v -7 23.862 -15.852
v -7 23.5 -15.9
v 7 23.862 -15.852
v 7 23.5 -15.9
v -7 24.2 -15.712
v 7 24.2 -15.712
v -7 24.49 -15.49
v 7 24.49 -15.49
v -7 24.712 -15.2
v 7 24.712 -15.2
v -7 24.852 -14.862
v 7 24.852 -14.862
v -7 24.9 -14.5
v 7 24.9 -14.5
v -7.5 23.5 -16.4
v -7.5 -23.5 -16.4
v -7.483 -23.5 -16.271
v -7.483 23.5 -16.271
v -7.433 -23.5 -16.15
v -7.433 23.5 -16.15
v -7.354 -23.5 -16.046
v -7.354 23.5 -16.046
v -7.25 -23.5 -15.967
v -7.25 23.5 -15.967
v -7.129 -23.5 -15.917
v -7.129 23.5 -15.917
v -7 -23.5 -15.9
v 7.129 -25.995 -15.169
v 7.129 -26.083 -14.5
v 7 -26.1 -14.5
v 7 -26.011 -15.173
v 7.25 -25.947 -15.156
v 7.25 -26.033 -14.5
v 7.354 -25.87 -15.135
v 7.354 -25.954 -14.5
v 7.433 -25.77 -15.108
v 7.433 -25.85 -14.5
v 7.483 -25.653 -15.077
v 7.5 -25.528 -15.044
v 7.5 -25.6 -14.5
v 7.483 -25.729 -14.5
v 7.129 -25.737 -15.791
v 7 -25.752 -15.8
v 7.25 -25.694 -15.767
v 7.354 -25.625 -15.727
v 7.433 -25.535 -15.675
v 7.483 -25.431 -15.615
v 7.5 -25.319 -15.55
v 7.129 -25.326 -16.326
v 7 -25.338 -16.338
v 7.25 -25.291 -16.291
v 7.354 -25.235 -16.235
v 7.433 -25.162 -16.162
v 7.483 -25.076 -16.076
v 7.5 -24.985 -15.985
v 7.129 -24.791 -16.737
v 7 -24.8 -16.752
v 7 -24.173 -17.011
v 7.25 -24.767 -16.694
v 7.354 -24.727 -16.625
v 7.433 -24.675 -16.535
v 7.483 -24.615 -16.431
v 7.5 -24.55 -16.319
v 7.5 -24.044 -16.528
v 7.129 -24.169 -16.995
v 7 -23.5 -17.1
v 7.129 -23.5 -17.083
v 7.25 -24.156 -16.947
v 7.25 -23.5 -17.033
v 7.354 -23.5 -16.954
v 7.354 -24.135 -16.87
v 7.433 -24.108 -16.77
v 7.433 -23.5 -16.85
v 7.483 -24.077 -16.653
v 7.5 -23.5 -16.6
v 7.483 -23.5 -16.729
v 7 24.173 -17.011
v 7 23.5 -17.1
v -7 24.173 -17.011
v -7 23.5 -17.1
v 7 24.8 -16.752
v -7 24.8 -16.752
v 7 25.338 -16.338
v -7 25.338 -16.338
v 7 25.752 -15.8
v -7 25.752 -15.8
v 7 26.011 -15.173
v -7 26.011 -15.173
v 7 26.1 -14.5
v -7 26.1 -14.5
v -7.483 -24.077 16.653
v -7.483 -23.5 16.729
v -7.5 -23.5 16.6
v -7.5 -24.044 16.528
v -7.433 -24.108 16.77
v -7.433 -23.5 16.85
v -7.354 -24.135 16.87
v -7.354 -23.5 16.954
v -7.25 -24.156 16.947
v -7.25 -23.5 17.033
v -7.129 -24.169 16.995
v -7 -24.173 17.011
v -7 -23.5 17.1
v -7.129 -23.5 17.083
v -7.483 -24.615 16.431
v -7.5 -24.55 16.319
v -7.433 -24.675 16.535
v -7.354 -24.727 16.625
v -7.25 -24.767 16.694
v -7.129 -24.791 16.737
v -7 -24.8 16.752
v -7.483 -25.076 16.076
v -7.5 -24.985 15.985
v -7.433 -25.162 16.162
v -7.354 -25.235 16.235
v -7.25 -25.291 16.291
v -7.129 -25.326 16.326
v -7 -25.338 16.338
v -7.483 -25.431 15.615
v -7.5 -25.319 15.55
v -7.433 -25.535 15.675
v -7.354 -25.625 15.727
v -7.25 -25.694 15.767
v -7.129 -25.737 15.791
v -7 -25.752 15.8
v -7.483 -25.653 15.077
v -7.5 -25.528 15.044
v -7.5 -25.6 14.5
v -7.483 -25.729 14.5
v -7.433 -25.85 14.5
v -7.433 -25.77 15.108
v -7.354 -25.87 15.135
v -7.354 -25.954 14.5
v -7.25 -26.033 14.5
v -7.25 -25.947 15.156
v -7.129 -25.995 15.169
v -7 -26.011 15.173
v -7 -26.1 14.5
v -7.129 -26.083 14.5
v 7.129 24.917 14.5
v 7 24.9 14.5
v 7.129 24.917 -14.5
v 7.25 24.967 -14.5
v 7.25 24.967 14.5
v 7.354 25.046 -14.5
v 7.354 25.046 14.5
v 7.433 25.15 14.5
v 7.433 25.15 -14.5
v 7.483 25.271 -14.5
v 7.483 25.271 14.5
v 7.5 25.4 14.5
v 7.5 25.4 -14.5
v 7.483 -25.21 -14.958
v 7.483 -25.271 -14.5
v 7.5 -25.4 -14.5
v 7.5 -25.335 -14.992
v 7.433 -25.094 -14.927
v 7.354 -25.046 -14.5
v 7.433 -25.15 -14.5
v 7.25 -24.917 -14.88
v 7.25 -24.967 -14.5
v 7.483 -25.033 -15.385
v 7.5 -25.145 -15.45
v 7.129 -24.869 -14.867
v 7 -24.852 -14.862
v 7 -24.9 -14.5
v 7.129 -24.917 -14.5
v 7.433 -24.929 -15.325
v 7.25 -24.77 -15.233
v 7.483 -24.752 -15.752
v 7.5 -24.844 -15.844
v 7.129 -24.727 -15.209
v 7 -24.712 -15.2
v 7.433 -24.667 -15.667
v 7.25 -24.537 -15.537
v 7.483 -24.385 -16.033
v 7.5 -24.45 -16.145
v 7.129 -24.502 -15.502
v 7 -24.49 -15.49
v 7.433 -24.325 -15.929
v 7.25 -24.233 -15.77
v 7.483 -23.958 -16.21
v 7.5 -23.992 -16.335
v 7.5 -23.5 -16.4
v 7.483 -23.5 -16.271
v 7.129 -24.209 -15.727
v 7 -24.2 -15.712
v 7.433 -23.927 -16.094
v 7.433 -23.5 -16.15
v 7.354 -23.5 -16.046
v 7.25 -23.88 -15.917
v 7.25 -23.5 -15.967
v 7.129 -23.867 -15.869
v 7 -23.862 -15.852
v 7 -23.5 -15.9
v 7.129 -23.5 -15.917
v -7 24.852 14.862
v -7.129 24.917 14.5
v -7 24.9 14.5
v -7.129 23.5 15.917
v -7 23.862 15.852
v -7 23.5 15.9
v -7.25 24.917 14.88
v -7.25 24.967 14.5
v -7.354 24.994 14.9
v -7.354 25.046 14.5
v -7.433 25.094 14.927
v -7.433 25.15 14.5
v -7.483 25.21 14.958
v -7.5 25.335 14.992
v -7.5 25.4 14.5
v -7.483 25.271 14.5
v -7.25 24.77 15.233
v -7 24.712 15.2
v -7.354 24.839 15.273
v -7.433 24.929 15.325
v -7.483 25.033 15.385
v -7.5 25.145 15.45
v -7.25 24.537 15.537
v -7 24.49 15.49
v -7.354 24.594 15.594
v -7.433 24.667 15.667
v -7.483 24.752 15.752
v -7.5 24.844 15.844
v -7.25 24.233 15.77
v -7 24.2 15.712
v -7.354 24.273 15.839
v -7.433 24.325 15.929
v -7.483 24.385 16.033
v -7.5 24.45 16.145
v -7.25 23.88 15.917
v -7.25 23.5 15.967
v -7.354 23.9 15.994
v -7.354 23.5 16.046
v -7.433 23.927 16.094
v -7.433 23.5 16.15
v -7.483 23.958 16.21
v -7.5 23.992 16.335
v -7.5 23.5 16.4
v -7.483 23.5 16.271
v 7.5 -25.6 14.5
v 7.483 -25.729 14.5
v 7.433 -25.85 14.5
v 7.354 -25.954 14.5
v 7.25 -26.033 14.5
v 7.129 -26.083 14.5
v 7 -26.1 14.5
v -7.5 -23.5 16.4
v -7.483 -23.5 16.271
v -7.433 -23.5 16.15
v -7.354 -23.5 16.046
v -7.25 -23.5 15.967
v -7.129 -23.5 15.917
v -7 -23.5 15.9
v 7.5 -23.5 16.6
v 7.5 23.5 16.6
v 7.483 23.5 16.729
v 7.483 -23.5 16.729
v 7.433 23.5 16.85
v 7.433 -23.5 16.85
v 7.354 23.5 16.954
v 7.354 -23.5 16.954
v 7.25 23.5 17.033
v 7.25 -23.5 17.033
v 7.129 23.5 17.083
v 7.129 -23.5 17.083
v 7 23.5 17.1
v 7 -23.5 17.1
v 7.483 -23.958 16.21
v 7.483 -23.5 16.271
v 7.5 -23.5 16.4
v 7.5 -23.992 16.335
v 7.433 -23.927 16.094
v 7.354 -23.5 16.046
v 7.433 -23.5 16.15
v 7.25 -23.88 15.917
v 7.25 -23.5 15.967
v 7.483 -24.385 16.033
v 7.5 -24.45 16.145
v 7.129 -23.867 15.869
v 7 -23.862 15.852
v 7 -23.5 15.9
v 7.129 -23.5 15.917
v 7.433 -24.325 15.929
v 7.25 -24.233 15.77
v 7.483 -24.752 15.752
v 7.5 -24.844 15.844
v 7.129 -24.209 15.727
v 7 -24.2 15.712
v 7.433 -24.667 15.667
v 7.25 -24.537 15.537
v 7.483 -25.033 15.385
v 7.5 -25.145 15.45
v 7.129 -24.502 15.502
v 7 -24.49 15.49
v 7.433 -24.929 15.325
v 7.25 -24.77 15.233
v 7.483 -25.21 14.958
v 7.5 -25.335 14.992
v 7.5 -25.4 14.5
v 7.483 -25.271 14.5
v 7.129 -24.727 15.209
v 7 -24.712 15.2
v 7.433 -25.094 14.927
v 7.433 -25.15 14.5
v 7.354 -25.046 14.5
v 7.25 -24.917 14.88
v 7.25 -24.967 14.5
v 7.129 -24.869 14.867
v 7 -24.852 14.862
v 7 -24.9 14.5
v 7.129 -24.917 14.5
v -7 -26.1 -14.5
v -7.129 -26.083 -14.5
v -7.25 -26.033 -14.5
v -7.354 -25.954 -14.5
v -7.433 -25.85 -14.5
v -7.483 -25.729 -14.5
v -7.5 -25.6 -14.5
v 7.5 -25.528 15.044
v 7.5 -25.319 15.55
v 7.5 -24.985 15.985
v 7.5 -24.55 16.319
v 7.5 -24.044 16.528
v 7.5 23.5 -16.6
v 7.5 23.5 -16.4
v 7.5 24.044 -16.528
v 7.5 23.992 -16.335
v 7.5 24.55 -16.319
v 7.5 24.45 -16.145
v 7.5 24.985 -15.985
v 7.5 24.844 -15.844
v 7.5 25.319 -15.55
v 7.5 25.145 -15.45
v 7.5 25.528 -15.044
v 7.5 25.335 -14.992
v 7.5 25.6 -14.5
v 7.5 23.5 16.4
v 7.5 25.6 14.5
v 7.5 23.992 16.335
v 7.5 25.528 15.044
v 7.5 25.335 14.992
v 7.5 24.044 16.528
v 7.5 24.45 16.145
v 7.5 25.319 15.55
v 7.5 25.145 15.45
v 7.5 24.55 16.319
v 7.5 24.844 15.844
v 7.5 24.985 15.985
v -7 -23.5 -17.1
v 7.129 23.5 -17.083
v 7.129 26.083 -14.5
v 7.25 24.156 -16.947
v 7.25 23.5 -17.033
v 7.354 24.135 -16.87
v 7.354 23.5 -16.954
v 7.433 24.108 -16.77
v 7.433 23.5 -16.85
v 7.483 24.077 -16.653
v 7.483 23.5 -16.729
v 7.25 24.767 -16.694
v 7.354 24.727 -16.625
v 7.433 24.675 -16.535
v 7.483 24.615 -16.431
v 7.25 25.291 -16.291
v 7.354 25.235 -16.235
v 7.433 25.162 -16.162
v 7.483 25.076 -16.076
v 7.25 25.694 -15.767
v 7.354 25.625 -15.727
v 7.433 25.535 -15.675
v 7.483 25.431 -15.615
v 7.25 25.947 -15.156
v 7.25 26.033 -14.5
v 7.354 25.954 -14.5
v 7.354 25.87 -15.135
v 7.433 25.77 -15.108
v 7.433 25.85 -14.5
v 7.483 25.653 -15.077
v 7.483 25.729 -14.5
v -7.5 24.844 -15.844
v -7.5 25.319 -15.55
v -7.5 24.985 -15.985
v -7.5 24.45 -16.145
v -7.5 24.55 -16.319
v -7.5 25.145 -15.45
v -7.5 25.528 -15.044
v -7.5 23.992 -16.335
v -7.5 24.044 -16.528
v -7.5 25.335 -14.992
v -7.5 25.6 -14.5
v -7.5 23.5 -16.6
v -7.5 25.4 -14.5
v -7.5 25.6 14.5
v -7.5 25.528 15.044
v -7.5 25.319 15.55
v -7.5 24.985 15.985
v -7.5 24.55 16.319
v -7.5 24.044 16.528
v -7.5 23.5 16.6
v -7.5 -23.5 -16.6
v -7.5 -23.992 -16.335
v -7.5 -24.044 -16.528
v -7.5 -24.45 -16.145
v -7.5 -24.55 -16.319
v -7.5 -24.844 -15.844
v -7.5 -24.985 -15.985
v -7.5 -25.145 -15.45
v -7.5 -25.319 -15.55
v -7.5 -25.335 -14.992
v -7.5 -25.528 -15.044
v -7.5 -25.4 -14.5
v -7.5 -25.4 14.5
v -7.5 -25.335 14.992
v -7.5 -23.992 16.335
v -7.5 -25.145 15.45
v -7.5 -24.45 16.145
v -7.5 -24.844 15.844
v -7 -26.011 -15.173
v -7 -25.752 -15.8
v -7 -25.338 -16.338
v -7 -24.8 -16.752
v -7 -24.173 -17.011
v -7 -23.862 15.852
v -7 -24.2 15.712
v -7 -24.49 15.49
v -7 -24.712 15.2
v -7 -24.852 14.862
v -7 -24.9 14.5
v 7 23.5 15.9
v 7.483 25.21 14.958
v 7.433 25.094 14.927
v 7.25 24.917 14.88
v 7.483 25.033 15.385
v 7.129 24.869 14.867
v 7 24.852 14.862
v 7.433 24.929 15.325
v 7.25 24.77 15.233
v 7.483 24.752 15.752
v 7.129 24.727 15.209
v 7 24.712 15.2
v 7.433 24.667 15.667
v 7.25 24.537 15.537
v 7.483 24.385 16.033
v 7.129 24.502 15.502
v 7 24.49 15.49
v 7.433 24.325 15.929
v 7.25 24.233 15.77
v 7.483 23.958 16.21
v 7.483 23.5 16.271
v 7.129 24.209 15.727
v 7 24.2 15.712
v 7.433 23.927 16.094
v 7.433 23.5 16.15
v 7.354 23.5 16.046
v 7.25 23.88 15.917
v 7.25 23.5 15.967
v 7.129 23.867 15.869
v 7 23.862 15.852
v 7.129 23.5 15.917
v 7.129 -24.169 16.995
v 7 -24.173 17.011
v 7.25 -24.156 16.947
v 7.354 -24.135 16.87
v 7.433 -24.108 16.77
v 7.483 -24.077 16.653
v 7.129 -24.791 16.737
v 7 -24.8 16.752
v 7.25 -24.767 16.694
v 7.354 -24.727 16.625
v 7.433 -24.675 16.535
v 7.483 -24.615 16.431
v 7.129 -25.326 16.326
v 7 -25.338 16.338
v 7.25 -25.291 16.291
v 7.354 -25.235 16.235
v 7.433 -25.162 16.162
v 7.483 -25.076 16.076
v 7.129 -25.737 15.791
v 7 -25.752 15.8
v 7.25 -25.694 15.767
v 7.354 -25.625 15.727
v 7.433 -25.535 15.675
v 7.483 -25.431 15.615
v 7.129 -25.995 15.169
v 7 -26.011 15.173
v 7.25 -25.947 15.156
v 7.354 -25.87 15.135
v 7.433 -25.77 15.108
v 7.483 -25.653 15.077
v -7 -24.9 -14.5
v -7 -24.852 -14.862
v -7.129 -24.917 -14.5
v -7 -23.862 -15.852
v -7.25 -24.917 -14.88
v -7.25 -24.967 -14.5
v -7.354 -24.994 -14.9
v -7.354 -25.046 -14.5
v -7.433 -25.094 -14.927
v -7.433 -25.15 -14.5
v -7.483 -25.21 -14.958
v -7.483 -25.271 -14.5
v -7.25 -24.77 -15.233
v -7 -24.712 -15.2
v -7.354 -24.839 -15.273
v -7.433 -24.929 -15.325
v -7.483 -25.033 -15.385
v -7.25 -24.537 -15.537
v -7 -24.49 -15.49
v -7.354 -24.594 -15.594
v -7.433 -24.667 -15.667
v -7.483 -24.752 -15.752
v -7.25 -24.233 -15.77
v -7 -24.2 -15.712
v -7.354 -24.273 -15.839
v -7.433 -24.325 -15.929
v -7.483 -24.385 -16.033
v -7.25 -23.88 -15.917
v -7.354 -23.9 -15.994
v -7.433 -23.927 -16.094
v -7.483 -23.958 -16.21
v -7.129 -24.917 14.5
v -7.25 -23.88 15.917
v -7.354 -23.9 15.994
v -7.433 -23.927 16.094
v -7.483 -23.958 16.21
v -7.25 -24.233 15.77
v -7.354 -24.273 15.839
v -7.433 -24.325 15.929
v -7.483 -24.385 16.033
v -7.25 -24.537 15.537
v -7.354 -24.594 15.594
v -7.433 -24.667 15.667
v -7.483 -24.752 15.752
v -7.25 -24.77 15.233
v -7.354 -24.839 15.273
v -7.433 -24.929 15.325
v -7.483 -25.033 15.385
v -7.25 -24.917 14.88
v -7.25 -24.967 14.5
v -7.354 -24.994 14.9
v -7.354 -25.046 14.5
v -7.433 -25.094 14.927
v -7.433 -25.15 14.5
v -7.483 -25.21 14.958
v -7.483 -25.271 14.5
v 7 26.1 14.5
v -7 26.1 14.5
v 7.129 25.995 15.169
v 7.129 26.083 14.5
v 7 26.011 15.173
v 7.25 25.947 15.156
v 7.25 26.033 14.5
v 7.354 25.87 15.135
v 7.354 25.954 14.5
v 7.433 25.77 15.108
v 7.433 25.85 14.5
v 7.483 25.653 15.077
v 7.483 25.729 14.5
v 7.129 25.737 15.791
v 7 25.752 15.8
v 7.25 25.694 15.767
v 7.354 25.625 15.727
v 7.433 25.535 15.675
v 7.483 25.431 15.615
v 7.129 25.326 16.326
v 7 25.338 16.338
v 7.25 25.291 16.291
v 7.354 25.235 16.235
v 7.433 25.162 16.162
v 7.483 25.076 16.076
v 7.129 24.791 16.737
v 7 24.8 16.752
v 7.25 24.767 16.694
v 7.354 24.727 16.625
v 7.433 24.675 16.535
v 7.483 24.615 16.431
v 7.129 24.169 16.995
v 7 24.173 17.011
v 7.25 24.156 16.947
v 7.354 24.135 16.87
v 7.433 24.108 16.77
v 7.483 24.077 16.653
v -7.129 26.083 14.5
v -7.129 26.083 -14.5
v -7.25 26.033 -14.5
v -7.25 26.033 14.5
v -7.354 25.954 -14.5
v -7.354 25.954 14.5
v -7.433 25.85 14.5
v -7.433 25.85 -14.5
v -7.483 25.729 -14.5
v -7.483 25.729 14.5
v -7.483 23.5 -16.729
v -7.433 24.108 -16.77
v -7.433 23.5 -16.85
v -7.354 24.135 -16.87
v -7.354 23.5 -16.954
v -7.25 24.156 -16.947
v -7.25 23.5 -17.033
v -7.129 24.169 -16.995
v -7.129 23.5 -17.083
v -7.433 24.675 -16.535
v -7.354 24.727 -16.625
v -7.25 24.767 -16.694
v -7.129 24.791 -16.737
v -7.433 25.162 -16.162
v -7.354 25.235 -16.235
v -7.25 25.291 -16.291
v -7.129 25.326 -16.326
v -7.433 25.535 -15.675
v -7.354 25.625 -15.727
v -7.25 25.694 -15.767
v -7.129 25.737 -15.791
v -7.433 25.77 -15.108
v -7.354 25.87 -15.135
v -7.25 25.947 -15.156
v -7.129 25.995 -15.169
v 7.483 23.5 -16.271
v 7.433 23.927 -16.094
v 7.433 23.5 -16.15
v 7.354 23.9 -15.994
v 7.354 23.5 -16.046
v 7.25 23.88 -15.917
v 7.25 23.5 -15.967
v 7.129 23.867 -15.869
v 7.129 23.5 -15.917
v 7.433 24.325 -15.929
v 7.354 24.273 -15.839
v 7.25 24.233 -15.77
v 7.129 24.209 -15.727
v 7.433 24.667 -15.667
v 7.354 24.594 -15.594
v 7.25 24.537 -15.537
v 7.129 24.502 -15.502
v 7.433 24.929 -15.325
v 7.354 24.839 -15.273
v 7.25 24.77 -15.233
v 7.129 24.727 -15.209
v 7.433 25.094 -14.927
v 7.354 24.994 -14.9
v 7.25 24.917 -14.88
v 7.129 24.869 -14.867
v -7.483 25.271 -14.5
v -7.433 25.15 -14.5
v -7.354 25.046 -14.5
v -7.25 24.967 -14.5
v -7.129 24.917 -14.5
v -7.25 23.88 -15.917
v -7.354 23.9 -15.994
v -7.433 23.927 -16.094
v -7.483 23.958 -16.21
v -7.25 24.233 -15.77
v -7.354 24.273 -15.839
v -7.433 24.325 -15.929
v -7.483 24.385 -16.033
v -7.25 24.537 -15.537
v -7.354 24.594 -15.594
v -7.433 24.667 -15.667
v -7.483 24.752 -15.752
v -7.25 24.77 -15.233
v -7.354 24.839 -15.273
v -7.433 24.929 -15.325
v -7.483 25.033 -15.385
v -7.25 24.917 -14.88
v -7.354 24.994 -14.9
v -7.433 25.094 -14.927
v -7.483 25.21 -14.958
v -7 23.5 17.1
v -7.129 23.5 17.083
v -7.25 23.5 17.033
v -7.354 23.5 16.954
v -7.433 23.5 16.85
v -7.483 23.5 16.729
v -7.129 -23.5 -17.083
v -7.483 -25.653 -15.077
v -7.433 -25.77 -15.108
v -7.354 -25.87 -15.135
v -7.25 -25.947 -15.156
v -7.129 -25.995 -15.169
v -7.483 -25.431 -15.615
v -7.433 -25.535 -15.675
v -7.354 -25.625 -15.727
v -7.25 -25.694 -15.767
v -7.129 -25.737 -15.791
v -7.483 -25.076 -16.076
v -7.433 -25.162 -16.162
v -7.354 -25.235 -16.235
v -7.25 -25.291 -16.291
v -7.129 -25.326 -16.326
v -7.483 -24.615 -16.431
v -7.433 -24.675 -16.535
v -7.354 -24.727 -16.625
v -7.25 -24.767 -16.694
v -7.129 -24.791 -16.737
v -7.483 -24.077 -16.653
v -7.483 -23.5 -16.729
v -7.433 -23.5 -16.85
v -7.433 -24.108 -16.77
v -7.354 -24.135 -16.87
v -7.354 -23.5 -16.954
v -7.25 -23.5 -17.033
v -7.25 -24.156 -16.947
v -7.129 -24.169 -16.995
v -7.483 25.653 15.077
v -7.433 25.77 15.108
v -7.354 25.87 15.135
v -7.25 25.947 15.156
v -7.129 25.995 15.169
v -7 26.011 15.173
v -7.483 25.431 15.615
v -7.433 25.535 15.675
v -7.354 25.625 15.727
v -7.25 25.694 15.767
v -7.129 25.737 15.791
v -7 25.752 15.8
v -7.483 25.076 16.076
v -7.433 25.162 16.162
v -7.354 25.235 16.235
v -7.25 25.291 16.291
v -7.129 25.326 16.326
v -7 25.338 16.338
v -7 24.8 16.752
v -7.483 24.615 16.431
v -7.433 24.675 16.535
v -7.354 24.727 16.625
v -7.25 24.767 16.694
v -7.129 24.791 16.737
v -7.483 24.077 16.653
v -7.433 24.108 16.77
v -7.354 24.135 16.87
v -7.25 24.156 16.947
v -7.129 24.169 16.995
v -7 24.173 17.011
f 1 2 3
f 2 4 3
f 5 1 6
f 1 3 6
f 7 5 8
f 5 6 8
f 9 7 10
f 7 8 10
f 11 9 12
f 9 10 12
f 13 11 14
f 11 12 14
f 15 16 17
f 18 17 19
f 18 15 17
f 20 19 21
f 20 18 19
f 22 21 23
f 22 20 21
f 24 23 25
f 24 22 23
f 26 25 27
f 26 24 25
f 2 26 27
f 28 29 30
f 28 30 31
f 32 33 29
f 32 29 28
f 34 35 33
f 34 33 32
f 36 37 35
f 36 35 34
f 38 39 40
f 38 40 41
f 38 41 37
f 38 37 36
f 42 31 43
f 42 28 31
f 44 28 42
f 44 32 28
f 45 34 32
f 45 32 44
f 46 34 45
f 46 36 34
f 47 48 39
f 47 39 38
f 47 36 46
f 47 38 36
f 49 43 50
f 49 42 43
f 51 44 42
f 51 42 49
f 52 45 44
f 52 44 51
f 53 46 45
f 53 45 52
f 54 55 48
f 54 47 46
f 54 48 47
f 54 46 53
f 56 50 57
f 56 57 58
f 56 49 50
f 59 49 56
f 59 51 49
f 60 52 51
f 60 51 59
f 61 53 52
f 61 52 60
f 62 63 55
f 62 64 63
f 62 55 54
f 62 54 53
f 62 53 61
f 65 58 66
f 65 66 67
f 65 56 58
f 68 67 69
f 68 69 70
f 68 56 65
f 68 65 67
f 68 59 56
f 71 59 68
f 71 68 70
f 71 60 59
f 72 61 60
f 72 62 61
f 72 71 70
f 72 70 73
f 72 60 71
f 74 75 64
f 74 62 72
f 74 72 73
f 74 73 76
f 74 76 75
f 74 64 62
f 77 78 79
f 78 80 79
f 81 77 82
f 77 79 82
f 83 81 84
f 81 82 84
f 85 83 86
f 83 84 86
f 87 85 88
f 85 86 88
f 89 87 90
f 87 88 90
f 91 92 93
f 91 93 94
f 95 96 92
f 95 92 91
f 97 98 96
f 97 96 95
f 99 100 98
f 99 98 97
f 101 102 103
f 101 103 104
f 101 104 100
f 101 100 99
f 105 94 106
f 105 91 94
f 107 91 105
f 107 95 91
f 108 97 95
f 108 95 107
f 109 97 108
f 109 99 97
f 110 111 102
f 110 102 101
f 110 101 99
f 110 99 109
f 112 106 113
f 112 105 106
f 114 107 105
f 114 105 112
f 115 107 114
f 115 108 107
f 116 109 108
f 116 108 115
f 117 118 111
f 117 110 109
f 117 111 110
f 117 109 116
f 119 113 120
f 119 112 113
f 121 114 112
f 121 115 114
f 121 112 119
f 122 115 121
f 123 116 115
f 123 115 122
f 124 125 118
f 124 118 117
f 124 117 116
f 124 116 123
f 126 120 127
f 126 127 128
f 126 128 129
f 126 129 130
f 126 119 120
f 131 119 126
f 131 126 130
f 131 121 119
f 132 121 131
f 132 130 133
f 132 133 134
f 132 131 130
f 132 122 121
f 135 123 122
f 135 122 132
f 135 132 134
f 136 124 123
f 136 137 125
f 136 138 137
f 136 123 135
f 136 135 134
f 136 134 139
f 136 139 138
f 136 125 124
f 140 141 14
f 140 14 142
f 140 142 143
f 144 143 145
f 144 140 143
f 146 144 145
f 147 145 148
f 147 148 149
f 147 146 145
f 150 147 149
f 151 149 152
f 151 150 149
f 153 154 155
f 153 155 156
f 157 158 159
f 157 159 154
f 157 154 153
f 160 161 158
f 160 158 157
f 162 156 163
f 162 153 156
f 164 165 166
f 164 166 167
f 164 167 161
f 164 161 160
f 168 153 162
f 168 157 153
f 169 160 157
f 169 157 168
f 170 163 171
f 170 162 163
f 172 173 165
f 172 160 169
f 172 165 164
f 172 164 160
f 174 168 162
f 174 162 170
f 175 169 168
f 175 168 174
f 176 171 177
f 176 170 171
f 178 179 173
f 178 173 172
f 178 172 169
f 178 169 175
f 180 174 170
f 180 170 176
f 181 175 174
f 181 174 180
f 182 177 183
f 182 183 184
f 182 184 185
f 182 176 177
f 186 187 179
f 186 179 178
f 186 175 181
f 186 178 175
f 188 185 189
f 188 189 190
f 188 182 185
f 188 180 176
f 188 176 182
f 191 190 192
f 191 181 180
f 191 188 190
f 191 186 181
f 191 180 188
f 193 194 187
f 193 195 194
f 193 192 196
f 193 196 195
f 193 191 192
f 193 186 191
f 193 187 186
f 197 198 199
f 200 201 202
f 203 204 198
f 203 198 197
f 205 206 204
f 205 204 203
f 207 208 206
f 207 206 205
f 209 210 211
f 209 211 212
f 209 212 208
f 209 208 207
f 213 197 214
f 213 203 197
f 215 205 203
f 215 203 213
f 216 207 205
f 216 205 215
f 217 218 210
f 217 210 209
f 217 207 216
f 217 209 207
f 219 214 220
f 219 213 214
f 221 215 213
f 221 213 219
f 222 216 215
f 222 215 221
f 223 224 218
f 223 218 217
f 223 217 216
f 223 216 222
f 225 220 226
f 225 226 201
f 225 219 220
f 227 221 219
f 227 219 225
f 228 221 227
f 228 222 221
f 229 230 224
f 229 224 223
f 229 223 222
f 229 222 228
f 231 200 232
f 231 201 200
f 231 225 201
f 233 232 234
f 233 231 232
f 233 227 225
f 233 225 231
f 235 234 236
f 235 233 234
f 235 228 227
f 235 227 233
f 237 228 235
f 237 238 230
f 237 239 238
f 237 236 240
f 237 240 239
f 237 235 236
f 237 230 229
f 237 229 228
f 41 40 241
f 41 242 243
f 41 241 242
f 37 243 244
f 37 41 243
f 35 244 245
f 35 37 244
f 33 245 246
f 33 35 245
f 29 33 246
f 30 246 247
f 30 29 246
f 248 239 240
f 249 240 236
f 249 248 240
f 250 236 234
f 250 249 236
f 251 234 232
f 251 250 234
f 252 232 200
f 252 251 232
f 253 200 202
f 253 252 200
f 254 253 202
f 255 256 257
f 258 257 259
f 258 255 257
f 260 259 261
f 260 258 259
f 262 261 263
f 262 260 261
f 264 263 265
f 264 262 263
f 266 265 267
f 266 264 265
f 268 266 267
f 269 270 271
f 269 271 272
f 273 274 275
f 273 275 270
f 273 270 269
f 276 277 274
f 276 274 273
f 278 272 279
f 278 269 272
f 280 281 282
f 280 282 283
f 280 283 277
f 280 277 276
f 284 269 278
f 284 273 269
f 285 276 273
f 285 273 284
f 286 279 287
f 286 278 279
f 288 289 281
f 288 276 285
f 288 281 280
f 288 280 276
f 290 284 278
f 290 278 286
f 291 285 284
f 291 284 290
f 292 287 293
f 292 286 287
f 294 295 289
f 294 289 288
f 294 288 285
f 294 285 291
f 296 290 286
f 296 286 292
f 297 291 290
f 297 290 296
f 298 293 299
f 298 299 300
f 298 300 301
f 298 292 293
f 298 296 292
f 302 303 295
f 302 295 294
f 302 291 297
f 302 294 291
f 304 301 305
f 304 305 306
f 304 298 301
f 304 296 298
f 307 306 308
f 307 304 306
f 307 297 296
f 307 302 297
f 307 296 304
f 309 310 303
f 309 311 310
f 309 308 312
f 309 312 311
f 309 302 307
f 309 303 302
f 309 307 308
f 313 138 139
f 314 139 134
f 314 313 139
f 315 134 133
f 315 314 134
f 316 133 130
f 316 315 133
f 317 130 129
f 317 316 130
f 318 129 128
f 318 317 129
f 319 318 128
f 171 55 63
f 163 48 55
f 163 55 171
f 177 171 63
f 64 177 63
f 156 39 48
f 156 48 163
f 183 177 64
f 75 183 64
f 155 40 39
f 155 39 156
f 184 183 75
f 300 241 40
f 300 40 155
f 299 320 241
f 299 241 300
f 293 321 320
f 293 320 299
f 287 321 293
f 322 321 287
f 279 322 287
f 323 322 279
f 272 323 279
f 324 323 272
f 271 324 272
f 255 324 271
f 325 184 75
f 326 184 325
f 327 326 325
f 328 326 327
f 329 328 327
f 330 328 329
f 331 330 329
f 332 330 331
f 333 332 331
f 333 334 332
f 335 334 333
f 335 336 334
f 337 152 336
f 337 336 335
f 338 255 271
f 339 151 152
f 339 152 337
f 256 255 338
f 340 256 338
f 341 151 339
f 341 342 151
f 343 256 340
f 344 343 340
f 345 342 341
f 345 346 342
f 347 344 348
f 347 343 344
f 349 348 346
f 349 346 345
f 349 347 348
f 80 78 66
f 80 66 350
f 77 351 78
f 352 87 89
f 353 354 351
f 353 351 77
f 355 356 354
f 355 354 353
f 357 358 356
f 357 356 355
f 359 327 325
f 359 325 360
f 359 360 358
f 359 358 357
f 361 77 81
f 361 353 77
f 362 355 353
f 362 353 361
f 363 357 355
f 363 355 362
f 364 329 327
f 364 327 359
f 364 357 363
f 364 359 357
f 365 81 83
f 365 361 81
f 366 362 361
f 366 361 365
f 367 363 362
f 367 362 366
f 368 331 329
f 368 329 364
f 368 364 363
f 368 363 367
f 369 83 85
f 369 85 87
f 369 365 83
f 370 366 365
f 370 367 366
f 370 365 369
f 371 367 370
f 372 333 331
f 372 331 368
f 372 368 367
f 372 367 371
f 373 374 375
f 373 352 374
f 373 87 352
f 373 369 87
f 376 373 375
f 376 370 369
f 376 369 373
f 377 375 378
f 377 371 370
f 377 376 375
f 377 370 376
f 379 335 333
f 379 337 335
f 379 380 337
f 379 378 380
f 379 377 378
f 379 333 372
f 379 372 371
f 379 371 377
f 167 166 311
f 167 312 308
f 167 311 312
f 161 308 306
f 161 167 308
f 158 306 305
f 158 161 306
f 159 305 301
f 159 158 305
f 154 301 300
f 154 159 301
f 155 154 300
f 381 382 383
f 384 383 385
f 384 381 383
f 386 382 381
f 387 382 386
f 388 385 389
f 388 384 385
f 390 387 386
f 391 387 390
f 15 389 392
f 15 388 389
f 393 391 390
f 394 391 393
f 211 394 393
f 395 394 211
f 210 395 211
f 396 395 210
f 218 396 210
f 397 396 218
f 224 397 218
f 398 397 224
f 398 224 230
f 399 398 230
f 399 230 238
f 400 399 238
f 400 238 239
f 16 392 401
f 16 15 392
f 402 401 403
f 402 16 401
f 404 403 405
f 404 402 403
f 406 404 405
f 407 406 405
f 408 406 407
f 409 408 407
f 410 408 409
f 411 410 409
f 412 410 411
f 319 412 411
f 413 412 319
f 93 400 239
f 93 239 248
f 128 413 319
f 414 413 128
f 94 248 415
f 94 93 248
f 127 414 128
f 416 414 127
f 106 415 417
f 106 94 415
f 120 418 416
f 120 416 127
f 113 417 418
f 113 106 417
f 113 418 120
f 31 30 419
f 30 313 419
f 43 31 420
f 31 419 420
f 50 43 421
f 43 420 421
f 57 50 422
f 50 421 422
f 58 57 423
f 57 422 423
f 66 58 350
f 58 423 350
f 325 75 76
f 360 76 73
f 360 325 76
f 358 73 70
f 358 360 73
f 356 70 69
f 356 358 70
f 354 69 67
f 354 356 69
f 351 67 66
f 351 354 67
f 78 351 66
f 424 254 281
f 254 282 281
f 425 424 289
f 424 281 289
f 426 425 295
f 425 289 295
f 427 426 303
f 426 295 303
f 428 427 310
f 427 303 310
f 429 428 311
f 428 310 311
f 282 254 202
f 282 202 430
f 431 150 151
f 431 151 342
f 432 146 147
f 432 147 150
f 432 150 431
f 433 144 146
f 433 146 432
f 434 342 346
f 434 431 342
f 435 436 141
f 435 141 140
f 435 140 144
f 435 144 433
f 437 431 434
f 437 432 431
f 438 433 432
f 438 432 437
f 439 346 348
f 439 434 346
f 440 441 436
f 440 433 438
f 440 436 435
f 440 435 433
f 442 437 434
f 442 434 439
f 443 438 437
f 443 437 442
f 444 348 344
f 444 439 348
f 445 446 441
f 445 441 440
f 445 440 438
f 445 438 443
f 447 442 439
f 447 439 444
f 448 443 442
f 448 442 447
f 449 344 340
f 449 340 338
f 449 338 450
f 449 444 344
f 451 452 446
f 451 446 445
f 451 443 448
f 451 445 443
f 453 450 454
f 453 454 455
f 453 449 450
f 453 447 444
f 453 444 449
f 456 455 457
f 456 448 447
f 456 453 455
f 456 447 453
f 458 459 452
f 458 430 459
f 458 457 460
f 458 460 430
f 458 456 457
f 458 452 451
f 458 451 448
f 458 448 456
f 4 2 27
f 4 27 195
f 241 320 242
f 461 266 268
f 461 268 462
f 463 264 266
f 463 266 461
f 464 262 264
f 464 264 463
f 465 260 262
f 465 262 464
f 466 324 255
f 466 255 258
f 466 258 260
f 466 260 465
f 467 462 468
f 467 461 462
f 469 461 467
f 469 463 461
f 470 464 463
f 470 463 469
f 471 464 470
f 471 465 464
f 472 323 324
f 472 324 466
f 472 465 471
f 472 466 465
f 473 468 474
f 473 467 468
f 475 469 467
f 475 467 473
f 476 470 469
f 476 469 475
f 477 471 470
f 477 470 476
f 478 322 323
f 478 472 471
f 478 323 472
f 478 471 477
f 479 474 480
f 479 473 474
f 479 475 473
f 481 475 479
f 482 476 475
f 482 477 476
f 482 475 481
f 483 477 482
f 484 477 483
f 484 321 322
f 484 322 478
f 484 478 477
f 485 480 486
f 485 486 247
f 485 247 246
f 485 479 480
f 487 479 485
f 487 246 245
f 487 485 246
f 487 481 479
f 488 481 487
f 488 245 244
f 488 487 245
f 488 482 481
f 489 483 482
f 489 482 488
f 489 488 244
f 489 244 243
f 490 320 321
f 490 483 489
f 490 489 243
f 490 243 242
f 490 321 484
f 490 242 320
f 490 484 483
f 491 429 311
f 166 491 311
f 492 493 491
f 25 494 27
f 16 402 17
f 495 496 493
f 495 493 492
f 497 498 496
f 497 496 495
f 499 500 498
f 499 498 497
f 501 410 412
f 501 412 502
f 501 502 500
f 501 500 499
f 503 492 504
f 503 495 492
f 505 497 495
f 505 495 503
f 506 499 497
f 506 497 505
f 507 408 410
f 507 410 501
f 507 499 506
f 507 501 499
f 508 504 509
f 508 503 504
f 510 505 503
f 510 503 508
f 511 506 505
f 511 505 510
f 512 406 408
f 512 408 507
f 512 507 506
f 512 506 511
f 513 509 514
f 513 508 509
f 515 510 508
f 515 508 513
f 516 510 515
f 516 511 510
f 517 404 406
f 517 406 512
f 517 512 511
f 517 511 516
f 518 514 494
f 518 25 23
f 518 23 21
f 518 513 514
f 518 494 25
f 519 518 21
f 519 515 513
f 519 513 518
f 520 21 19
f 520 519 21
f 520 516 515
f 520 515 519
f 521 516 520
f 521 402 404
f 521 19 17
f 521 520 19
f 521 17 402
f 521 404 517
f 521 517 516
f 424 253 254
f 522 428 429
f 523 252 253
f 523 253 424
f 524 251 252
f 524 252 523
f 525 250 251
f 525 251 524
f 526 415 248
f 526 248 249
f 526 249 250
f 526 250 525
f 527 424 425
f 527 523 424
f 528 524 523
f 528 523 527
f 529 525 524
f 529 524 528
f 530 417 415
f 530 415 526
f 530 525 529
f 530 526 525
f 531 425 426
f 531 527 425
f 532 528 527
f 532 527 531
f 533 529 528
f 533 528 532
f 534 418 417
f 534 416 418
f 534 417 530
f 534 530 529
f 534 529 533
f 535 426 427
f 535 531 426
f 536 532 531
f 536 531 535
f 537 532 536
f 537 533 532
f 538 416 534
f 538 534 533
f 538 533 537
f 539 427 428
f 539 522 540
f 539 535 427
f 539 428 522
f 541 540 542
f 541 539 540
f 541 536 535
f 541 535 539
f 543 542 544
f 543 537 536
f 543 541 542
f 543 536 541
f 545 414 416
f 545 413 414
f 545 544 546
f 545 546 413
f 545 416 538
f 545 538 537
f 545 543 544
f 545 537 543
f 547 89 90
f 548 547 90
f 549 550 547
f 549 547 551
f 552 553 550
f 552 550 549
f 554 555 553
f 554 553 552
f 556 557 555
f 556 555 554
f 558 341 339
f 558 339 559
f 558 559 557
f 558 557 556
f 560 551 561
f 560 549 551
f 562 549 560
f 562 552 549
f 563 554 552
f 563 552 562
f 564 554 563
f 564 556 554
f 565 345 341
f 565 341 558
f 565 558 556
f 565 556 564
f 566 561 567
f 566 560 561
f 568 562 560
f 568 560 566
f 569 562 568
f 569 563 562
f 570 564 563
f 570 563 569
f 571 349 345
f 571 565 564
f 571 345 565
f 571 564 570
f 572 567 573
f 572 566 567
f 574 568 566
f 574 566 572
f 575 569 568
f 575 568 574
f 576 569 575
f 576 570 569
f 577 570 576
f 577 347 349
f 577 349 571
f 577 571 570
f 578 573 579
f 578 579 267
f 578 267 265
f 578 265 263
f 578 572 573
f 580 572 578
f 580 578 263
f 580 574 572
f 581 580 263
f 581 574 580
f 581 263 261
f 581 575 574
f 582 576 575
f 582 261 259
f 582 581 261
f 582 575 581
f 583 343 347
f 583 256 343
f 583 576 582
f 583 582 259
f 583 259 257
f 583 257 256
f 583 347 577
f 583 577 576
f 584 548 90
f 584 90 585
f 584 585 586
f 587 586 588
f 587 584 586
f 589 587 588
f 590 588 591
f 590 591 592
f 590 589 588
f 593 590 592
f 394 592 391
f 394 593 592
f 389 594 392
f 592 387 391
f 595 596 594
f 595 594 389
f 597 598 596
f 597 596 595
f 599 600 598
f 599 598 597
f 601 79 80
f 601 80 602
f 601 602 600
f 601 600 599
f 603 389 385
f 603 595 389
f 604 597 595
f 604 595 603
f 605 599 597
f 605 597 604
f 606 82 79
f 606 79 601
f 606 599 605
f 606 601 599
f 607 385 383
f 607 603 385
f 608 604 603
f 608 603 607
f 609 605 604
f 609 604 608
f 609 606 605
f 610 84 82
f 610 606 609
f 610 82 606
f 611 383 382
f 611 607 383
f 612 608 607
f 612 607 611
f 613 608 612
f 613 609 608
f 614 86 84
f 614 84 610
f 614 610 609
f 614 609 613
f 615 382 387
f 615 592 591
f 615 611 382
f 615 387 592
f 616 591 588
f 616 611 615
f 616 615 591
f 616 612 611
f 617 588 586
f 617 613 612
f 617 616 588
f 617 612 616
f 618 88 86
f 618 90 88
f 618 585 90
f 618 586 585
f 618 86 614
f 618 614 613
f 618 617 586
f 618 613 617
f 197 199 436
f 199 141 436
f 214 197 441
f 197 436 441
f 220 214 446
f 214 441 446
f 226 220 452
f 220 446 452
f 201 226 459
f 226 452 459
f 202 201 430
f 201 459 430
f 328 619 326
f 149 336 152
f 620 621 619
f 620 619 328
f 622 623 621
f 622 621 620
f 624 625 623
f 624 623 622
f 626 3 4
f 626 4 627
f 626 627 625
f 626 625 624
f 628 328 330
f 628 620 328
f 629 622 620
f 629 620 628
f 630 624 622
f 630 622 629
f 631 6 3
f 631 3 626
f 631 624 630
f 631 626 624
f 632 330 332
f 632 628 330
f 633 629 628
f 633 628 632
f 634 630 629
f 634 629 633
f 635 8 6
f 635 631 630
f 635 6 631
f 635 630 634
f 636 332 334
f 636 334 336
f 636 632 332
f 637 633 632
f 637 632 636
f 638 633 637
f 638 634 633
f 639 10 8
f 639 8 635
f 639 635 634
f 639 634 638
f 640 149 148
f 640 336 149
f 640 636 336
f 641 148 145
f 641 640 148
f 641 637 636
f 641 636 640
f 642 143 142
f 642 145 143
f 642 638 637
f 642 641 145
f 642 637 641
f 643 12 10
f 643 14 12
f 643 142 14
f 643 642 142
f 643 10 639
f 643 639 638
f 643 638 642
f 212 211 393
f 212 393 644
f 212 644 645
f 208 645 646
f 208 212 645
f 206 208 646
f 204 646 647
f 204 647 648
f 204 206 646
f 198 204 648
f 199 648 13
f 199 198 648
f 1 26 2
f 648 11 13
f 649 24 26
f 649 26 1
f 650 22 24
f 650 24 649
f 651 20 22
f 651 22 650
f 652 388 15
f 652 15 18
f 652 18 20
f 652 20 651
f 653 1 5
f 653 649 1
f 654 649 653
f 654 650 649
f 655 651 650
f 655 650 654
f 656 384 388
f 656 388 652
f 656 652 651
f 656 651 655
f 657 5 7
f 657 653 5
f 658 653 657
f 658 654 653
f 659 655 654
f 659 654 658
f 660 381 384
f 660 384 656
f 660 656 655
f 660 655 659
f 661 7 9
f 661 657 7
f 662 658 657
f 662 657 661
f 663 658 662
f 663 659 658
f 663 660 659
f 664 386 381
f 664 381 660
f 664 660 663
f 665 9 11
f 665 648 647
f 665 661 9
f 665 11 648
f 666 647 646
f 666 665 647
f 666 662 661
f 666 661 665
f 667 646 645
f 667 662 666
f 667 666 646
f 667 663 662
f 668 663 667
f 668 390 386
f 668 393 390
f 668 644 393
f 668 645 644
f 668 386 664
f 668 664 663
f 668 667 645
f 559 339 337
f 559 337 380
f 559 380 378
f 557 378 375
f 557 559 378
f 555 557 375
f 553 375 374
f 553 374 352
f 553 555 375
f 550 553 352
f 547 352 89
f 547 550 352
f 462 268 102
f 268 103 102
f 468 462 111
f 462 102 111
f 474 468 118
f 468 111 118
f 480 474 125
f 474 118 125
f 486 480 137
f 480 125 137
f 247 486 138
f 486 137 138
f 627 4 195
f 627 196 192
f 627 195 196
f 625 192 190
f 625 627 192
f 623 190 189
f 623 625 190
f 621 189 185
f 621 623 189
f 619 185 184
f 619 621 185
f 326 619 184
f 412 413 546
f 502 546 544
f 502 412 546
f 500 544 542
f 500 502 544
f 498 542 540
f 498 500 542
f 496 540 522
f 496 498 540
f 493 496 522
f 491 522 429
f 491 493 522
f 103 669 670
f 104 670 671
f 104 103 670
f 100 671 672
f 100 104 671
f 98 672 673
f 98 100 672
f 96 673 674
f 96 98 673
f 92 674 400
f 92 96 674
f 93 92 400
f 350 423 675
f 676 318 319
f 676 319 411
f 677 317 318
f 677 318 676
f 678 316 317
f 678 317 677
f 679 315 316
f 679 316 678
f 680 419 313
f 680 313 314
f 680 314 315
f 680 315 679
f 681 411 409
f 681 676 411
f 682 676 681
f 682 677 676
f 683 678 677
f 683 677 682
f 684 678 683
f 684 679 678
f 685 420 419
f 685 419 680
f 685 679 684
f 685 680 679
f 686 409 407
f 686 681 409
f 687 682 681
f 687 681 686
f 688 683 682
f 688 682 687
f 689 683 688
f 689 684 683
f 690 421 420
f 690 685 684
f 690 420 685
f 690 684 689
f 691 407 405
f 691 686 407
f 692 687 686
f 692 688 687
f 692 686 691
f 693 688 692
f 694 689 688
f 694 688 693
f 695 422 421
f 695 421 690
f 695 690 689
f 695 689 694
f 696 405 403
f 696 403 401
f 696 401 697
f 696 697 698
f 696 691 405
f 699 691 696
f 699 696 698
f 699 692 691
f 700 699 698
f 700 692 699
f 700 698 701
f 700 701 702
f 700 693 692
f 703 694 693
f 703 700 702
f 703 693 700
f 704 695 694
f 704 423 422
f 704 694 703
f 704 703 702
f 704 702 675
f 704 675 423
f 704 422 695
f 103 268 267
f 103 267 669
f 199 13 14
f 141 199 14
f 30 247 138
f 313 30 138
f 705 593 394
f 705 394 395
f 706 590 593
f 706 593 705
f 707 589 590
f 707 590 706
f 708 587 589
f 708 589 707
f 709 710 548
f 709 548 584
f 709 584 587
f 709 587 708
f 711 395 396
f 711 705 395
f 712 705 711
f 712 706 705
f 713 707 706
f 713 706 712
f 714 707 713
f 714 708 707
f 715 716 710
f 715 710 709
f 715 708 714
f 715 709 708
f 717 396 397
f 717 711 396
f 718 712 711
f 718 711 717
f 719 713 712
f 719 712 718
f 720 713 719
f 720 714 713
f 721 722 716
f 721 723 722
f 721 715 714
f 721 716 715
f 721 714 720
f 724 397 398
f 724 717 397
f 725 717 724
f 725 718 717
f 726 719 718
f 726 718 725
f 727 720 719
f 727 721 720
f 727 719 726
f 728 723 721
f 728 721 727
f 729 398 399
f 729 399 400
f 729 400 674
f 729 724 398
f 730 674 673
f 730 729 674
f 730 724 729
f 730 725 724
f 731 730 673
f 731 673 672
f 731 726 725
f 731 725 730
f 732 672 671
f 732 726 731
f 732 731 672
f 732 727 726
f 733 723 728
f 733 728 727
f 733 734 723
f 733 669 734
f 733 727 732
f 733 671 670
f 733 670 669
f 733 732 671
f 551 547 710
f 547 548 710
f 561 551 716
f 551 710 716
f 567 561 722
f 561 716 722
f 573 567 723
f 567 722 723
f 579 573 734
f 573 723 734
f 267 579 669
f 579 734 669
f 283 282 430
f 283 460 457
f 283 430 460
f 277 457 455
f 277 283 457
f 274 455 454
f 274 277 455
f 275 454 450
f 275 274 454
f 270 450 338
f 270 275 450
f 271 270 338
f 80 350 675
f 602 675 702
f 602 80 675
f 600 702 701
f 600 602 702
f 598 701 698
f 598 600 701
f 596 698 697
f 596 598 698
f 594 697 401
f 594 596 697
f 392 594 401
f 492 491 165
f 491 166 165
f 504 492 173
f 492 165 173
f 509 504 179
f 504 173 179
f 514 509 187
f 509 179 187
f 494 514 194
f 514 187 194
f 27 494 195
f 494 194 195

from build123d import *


with BuildPart() as part:
    # Sweep1: sweep along a path in Sketch1
    with BuildLine(Plane(origin=(0, 0, 0), x_dir=(0, 0, -1), z_dir=(1, 0, 0))) as sweep1_path:
        Line((14.5, 25.5), (-14.5, 25.5))
        ThreePointArc((-14.5, 25.5), (-15.914213562, 24.914213562), (-16.5, 23.5))
        Line((-16.5, 23.5), (-16.5, -23.5))
        ThreePointArc((-16.5, -23.5), (-15.914213562, -24.914213562), (-14.5, -25.5))
        Line((-14.5, -25.5), (14.5, -25.5))
        ThreePointArc((14.5, -25.5), (15.914213562, -24.914213562), (16.5, -23.5))
        Line((16.5, -23.5), (16.5, 23.5))
        ThreePointArc((16.5, 23.5), (15.914213562, 24.914213562), (14.5, 25.5))
    # Sketch2 → Sweep1 (sweep)
    with BuildSketch(Plane.XY):
        with BuildLine():
            Line((-7, 26.1), (7, 26.1))
            ThreePointArc((7, 26.1), (7.353553391, 25.953553391), (7.5, 25.6))
            Line((7.5, 25.6), (7.5, 25.4))
            ThreePointArc((7.5, 25.4), (7.353553391, 25.046446609), (7, 24.9))
            Line((7, 24.9), (-7, 24.9))
            ThreePointArc((-7, 24.9), (-7.353553391, 25.046446609), (-7.5, 25.4))
            Line((-7.5, 25.4), (-7.5, 25.6))
            ThreePointArc((-7.5, 25.6), (-7.353553391, 25.953553391), (-7, 26.1))
        make_face()
    sweep(path=sweep1_path.line)


solid = part.part
